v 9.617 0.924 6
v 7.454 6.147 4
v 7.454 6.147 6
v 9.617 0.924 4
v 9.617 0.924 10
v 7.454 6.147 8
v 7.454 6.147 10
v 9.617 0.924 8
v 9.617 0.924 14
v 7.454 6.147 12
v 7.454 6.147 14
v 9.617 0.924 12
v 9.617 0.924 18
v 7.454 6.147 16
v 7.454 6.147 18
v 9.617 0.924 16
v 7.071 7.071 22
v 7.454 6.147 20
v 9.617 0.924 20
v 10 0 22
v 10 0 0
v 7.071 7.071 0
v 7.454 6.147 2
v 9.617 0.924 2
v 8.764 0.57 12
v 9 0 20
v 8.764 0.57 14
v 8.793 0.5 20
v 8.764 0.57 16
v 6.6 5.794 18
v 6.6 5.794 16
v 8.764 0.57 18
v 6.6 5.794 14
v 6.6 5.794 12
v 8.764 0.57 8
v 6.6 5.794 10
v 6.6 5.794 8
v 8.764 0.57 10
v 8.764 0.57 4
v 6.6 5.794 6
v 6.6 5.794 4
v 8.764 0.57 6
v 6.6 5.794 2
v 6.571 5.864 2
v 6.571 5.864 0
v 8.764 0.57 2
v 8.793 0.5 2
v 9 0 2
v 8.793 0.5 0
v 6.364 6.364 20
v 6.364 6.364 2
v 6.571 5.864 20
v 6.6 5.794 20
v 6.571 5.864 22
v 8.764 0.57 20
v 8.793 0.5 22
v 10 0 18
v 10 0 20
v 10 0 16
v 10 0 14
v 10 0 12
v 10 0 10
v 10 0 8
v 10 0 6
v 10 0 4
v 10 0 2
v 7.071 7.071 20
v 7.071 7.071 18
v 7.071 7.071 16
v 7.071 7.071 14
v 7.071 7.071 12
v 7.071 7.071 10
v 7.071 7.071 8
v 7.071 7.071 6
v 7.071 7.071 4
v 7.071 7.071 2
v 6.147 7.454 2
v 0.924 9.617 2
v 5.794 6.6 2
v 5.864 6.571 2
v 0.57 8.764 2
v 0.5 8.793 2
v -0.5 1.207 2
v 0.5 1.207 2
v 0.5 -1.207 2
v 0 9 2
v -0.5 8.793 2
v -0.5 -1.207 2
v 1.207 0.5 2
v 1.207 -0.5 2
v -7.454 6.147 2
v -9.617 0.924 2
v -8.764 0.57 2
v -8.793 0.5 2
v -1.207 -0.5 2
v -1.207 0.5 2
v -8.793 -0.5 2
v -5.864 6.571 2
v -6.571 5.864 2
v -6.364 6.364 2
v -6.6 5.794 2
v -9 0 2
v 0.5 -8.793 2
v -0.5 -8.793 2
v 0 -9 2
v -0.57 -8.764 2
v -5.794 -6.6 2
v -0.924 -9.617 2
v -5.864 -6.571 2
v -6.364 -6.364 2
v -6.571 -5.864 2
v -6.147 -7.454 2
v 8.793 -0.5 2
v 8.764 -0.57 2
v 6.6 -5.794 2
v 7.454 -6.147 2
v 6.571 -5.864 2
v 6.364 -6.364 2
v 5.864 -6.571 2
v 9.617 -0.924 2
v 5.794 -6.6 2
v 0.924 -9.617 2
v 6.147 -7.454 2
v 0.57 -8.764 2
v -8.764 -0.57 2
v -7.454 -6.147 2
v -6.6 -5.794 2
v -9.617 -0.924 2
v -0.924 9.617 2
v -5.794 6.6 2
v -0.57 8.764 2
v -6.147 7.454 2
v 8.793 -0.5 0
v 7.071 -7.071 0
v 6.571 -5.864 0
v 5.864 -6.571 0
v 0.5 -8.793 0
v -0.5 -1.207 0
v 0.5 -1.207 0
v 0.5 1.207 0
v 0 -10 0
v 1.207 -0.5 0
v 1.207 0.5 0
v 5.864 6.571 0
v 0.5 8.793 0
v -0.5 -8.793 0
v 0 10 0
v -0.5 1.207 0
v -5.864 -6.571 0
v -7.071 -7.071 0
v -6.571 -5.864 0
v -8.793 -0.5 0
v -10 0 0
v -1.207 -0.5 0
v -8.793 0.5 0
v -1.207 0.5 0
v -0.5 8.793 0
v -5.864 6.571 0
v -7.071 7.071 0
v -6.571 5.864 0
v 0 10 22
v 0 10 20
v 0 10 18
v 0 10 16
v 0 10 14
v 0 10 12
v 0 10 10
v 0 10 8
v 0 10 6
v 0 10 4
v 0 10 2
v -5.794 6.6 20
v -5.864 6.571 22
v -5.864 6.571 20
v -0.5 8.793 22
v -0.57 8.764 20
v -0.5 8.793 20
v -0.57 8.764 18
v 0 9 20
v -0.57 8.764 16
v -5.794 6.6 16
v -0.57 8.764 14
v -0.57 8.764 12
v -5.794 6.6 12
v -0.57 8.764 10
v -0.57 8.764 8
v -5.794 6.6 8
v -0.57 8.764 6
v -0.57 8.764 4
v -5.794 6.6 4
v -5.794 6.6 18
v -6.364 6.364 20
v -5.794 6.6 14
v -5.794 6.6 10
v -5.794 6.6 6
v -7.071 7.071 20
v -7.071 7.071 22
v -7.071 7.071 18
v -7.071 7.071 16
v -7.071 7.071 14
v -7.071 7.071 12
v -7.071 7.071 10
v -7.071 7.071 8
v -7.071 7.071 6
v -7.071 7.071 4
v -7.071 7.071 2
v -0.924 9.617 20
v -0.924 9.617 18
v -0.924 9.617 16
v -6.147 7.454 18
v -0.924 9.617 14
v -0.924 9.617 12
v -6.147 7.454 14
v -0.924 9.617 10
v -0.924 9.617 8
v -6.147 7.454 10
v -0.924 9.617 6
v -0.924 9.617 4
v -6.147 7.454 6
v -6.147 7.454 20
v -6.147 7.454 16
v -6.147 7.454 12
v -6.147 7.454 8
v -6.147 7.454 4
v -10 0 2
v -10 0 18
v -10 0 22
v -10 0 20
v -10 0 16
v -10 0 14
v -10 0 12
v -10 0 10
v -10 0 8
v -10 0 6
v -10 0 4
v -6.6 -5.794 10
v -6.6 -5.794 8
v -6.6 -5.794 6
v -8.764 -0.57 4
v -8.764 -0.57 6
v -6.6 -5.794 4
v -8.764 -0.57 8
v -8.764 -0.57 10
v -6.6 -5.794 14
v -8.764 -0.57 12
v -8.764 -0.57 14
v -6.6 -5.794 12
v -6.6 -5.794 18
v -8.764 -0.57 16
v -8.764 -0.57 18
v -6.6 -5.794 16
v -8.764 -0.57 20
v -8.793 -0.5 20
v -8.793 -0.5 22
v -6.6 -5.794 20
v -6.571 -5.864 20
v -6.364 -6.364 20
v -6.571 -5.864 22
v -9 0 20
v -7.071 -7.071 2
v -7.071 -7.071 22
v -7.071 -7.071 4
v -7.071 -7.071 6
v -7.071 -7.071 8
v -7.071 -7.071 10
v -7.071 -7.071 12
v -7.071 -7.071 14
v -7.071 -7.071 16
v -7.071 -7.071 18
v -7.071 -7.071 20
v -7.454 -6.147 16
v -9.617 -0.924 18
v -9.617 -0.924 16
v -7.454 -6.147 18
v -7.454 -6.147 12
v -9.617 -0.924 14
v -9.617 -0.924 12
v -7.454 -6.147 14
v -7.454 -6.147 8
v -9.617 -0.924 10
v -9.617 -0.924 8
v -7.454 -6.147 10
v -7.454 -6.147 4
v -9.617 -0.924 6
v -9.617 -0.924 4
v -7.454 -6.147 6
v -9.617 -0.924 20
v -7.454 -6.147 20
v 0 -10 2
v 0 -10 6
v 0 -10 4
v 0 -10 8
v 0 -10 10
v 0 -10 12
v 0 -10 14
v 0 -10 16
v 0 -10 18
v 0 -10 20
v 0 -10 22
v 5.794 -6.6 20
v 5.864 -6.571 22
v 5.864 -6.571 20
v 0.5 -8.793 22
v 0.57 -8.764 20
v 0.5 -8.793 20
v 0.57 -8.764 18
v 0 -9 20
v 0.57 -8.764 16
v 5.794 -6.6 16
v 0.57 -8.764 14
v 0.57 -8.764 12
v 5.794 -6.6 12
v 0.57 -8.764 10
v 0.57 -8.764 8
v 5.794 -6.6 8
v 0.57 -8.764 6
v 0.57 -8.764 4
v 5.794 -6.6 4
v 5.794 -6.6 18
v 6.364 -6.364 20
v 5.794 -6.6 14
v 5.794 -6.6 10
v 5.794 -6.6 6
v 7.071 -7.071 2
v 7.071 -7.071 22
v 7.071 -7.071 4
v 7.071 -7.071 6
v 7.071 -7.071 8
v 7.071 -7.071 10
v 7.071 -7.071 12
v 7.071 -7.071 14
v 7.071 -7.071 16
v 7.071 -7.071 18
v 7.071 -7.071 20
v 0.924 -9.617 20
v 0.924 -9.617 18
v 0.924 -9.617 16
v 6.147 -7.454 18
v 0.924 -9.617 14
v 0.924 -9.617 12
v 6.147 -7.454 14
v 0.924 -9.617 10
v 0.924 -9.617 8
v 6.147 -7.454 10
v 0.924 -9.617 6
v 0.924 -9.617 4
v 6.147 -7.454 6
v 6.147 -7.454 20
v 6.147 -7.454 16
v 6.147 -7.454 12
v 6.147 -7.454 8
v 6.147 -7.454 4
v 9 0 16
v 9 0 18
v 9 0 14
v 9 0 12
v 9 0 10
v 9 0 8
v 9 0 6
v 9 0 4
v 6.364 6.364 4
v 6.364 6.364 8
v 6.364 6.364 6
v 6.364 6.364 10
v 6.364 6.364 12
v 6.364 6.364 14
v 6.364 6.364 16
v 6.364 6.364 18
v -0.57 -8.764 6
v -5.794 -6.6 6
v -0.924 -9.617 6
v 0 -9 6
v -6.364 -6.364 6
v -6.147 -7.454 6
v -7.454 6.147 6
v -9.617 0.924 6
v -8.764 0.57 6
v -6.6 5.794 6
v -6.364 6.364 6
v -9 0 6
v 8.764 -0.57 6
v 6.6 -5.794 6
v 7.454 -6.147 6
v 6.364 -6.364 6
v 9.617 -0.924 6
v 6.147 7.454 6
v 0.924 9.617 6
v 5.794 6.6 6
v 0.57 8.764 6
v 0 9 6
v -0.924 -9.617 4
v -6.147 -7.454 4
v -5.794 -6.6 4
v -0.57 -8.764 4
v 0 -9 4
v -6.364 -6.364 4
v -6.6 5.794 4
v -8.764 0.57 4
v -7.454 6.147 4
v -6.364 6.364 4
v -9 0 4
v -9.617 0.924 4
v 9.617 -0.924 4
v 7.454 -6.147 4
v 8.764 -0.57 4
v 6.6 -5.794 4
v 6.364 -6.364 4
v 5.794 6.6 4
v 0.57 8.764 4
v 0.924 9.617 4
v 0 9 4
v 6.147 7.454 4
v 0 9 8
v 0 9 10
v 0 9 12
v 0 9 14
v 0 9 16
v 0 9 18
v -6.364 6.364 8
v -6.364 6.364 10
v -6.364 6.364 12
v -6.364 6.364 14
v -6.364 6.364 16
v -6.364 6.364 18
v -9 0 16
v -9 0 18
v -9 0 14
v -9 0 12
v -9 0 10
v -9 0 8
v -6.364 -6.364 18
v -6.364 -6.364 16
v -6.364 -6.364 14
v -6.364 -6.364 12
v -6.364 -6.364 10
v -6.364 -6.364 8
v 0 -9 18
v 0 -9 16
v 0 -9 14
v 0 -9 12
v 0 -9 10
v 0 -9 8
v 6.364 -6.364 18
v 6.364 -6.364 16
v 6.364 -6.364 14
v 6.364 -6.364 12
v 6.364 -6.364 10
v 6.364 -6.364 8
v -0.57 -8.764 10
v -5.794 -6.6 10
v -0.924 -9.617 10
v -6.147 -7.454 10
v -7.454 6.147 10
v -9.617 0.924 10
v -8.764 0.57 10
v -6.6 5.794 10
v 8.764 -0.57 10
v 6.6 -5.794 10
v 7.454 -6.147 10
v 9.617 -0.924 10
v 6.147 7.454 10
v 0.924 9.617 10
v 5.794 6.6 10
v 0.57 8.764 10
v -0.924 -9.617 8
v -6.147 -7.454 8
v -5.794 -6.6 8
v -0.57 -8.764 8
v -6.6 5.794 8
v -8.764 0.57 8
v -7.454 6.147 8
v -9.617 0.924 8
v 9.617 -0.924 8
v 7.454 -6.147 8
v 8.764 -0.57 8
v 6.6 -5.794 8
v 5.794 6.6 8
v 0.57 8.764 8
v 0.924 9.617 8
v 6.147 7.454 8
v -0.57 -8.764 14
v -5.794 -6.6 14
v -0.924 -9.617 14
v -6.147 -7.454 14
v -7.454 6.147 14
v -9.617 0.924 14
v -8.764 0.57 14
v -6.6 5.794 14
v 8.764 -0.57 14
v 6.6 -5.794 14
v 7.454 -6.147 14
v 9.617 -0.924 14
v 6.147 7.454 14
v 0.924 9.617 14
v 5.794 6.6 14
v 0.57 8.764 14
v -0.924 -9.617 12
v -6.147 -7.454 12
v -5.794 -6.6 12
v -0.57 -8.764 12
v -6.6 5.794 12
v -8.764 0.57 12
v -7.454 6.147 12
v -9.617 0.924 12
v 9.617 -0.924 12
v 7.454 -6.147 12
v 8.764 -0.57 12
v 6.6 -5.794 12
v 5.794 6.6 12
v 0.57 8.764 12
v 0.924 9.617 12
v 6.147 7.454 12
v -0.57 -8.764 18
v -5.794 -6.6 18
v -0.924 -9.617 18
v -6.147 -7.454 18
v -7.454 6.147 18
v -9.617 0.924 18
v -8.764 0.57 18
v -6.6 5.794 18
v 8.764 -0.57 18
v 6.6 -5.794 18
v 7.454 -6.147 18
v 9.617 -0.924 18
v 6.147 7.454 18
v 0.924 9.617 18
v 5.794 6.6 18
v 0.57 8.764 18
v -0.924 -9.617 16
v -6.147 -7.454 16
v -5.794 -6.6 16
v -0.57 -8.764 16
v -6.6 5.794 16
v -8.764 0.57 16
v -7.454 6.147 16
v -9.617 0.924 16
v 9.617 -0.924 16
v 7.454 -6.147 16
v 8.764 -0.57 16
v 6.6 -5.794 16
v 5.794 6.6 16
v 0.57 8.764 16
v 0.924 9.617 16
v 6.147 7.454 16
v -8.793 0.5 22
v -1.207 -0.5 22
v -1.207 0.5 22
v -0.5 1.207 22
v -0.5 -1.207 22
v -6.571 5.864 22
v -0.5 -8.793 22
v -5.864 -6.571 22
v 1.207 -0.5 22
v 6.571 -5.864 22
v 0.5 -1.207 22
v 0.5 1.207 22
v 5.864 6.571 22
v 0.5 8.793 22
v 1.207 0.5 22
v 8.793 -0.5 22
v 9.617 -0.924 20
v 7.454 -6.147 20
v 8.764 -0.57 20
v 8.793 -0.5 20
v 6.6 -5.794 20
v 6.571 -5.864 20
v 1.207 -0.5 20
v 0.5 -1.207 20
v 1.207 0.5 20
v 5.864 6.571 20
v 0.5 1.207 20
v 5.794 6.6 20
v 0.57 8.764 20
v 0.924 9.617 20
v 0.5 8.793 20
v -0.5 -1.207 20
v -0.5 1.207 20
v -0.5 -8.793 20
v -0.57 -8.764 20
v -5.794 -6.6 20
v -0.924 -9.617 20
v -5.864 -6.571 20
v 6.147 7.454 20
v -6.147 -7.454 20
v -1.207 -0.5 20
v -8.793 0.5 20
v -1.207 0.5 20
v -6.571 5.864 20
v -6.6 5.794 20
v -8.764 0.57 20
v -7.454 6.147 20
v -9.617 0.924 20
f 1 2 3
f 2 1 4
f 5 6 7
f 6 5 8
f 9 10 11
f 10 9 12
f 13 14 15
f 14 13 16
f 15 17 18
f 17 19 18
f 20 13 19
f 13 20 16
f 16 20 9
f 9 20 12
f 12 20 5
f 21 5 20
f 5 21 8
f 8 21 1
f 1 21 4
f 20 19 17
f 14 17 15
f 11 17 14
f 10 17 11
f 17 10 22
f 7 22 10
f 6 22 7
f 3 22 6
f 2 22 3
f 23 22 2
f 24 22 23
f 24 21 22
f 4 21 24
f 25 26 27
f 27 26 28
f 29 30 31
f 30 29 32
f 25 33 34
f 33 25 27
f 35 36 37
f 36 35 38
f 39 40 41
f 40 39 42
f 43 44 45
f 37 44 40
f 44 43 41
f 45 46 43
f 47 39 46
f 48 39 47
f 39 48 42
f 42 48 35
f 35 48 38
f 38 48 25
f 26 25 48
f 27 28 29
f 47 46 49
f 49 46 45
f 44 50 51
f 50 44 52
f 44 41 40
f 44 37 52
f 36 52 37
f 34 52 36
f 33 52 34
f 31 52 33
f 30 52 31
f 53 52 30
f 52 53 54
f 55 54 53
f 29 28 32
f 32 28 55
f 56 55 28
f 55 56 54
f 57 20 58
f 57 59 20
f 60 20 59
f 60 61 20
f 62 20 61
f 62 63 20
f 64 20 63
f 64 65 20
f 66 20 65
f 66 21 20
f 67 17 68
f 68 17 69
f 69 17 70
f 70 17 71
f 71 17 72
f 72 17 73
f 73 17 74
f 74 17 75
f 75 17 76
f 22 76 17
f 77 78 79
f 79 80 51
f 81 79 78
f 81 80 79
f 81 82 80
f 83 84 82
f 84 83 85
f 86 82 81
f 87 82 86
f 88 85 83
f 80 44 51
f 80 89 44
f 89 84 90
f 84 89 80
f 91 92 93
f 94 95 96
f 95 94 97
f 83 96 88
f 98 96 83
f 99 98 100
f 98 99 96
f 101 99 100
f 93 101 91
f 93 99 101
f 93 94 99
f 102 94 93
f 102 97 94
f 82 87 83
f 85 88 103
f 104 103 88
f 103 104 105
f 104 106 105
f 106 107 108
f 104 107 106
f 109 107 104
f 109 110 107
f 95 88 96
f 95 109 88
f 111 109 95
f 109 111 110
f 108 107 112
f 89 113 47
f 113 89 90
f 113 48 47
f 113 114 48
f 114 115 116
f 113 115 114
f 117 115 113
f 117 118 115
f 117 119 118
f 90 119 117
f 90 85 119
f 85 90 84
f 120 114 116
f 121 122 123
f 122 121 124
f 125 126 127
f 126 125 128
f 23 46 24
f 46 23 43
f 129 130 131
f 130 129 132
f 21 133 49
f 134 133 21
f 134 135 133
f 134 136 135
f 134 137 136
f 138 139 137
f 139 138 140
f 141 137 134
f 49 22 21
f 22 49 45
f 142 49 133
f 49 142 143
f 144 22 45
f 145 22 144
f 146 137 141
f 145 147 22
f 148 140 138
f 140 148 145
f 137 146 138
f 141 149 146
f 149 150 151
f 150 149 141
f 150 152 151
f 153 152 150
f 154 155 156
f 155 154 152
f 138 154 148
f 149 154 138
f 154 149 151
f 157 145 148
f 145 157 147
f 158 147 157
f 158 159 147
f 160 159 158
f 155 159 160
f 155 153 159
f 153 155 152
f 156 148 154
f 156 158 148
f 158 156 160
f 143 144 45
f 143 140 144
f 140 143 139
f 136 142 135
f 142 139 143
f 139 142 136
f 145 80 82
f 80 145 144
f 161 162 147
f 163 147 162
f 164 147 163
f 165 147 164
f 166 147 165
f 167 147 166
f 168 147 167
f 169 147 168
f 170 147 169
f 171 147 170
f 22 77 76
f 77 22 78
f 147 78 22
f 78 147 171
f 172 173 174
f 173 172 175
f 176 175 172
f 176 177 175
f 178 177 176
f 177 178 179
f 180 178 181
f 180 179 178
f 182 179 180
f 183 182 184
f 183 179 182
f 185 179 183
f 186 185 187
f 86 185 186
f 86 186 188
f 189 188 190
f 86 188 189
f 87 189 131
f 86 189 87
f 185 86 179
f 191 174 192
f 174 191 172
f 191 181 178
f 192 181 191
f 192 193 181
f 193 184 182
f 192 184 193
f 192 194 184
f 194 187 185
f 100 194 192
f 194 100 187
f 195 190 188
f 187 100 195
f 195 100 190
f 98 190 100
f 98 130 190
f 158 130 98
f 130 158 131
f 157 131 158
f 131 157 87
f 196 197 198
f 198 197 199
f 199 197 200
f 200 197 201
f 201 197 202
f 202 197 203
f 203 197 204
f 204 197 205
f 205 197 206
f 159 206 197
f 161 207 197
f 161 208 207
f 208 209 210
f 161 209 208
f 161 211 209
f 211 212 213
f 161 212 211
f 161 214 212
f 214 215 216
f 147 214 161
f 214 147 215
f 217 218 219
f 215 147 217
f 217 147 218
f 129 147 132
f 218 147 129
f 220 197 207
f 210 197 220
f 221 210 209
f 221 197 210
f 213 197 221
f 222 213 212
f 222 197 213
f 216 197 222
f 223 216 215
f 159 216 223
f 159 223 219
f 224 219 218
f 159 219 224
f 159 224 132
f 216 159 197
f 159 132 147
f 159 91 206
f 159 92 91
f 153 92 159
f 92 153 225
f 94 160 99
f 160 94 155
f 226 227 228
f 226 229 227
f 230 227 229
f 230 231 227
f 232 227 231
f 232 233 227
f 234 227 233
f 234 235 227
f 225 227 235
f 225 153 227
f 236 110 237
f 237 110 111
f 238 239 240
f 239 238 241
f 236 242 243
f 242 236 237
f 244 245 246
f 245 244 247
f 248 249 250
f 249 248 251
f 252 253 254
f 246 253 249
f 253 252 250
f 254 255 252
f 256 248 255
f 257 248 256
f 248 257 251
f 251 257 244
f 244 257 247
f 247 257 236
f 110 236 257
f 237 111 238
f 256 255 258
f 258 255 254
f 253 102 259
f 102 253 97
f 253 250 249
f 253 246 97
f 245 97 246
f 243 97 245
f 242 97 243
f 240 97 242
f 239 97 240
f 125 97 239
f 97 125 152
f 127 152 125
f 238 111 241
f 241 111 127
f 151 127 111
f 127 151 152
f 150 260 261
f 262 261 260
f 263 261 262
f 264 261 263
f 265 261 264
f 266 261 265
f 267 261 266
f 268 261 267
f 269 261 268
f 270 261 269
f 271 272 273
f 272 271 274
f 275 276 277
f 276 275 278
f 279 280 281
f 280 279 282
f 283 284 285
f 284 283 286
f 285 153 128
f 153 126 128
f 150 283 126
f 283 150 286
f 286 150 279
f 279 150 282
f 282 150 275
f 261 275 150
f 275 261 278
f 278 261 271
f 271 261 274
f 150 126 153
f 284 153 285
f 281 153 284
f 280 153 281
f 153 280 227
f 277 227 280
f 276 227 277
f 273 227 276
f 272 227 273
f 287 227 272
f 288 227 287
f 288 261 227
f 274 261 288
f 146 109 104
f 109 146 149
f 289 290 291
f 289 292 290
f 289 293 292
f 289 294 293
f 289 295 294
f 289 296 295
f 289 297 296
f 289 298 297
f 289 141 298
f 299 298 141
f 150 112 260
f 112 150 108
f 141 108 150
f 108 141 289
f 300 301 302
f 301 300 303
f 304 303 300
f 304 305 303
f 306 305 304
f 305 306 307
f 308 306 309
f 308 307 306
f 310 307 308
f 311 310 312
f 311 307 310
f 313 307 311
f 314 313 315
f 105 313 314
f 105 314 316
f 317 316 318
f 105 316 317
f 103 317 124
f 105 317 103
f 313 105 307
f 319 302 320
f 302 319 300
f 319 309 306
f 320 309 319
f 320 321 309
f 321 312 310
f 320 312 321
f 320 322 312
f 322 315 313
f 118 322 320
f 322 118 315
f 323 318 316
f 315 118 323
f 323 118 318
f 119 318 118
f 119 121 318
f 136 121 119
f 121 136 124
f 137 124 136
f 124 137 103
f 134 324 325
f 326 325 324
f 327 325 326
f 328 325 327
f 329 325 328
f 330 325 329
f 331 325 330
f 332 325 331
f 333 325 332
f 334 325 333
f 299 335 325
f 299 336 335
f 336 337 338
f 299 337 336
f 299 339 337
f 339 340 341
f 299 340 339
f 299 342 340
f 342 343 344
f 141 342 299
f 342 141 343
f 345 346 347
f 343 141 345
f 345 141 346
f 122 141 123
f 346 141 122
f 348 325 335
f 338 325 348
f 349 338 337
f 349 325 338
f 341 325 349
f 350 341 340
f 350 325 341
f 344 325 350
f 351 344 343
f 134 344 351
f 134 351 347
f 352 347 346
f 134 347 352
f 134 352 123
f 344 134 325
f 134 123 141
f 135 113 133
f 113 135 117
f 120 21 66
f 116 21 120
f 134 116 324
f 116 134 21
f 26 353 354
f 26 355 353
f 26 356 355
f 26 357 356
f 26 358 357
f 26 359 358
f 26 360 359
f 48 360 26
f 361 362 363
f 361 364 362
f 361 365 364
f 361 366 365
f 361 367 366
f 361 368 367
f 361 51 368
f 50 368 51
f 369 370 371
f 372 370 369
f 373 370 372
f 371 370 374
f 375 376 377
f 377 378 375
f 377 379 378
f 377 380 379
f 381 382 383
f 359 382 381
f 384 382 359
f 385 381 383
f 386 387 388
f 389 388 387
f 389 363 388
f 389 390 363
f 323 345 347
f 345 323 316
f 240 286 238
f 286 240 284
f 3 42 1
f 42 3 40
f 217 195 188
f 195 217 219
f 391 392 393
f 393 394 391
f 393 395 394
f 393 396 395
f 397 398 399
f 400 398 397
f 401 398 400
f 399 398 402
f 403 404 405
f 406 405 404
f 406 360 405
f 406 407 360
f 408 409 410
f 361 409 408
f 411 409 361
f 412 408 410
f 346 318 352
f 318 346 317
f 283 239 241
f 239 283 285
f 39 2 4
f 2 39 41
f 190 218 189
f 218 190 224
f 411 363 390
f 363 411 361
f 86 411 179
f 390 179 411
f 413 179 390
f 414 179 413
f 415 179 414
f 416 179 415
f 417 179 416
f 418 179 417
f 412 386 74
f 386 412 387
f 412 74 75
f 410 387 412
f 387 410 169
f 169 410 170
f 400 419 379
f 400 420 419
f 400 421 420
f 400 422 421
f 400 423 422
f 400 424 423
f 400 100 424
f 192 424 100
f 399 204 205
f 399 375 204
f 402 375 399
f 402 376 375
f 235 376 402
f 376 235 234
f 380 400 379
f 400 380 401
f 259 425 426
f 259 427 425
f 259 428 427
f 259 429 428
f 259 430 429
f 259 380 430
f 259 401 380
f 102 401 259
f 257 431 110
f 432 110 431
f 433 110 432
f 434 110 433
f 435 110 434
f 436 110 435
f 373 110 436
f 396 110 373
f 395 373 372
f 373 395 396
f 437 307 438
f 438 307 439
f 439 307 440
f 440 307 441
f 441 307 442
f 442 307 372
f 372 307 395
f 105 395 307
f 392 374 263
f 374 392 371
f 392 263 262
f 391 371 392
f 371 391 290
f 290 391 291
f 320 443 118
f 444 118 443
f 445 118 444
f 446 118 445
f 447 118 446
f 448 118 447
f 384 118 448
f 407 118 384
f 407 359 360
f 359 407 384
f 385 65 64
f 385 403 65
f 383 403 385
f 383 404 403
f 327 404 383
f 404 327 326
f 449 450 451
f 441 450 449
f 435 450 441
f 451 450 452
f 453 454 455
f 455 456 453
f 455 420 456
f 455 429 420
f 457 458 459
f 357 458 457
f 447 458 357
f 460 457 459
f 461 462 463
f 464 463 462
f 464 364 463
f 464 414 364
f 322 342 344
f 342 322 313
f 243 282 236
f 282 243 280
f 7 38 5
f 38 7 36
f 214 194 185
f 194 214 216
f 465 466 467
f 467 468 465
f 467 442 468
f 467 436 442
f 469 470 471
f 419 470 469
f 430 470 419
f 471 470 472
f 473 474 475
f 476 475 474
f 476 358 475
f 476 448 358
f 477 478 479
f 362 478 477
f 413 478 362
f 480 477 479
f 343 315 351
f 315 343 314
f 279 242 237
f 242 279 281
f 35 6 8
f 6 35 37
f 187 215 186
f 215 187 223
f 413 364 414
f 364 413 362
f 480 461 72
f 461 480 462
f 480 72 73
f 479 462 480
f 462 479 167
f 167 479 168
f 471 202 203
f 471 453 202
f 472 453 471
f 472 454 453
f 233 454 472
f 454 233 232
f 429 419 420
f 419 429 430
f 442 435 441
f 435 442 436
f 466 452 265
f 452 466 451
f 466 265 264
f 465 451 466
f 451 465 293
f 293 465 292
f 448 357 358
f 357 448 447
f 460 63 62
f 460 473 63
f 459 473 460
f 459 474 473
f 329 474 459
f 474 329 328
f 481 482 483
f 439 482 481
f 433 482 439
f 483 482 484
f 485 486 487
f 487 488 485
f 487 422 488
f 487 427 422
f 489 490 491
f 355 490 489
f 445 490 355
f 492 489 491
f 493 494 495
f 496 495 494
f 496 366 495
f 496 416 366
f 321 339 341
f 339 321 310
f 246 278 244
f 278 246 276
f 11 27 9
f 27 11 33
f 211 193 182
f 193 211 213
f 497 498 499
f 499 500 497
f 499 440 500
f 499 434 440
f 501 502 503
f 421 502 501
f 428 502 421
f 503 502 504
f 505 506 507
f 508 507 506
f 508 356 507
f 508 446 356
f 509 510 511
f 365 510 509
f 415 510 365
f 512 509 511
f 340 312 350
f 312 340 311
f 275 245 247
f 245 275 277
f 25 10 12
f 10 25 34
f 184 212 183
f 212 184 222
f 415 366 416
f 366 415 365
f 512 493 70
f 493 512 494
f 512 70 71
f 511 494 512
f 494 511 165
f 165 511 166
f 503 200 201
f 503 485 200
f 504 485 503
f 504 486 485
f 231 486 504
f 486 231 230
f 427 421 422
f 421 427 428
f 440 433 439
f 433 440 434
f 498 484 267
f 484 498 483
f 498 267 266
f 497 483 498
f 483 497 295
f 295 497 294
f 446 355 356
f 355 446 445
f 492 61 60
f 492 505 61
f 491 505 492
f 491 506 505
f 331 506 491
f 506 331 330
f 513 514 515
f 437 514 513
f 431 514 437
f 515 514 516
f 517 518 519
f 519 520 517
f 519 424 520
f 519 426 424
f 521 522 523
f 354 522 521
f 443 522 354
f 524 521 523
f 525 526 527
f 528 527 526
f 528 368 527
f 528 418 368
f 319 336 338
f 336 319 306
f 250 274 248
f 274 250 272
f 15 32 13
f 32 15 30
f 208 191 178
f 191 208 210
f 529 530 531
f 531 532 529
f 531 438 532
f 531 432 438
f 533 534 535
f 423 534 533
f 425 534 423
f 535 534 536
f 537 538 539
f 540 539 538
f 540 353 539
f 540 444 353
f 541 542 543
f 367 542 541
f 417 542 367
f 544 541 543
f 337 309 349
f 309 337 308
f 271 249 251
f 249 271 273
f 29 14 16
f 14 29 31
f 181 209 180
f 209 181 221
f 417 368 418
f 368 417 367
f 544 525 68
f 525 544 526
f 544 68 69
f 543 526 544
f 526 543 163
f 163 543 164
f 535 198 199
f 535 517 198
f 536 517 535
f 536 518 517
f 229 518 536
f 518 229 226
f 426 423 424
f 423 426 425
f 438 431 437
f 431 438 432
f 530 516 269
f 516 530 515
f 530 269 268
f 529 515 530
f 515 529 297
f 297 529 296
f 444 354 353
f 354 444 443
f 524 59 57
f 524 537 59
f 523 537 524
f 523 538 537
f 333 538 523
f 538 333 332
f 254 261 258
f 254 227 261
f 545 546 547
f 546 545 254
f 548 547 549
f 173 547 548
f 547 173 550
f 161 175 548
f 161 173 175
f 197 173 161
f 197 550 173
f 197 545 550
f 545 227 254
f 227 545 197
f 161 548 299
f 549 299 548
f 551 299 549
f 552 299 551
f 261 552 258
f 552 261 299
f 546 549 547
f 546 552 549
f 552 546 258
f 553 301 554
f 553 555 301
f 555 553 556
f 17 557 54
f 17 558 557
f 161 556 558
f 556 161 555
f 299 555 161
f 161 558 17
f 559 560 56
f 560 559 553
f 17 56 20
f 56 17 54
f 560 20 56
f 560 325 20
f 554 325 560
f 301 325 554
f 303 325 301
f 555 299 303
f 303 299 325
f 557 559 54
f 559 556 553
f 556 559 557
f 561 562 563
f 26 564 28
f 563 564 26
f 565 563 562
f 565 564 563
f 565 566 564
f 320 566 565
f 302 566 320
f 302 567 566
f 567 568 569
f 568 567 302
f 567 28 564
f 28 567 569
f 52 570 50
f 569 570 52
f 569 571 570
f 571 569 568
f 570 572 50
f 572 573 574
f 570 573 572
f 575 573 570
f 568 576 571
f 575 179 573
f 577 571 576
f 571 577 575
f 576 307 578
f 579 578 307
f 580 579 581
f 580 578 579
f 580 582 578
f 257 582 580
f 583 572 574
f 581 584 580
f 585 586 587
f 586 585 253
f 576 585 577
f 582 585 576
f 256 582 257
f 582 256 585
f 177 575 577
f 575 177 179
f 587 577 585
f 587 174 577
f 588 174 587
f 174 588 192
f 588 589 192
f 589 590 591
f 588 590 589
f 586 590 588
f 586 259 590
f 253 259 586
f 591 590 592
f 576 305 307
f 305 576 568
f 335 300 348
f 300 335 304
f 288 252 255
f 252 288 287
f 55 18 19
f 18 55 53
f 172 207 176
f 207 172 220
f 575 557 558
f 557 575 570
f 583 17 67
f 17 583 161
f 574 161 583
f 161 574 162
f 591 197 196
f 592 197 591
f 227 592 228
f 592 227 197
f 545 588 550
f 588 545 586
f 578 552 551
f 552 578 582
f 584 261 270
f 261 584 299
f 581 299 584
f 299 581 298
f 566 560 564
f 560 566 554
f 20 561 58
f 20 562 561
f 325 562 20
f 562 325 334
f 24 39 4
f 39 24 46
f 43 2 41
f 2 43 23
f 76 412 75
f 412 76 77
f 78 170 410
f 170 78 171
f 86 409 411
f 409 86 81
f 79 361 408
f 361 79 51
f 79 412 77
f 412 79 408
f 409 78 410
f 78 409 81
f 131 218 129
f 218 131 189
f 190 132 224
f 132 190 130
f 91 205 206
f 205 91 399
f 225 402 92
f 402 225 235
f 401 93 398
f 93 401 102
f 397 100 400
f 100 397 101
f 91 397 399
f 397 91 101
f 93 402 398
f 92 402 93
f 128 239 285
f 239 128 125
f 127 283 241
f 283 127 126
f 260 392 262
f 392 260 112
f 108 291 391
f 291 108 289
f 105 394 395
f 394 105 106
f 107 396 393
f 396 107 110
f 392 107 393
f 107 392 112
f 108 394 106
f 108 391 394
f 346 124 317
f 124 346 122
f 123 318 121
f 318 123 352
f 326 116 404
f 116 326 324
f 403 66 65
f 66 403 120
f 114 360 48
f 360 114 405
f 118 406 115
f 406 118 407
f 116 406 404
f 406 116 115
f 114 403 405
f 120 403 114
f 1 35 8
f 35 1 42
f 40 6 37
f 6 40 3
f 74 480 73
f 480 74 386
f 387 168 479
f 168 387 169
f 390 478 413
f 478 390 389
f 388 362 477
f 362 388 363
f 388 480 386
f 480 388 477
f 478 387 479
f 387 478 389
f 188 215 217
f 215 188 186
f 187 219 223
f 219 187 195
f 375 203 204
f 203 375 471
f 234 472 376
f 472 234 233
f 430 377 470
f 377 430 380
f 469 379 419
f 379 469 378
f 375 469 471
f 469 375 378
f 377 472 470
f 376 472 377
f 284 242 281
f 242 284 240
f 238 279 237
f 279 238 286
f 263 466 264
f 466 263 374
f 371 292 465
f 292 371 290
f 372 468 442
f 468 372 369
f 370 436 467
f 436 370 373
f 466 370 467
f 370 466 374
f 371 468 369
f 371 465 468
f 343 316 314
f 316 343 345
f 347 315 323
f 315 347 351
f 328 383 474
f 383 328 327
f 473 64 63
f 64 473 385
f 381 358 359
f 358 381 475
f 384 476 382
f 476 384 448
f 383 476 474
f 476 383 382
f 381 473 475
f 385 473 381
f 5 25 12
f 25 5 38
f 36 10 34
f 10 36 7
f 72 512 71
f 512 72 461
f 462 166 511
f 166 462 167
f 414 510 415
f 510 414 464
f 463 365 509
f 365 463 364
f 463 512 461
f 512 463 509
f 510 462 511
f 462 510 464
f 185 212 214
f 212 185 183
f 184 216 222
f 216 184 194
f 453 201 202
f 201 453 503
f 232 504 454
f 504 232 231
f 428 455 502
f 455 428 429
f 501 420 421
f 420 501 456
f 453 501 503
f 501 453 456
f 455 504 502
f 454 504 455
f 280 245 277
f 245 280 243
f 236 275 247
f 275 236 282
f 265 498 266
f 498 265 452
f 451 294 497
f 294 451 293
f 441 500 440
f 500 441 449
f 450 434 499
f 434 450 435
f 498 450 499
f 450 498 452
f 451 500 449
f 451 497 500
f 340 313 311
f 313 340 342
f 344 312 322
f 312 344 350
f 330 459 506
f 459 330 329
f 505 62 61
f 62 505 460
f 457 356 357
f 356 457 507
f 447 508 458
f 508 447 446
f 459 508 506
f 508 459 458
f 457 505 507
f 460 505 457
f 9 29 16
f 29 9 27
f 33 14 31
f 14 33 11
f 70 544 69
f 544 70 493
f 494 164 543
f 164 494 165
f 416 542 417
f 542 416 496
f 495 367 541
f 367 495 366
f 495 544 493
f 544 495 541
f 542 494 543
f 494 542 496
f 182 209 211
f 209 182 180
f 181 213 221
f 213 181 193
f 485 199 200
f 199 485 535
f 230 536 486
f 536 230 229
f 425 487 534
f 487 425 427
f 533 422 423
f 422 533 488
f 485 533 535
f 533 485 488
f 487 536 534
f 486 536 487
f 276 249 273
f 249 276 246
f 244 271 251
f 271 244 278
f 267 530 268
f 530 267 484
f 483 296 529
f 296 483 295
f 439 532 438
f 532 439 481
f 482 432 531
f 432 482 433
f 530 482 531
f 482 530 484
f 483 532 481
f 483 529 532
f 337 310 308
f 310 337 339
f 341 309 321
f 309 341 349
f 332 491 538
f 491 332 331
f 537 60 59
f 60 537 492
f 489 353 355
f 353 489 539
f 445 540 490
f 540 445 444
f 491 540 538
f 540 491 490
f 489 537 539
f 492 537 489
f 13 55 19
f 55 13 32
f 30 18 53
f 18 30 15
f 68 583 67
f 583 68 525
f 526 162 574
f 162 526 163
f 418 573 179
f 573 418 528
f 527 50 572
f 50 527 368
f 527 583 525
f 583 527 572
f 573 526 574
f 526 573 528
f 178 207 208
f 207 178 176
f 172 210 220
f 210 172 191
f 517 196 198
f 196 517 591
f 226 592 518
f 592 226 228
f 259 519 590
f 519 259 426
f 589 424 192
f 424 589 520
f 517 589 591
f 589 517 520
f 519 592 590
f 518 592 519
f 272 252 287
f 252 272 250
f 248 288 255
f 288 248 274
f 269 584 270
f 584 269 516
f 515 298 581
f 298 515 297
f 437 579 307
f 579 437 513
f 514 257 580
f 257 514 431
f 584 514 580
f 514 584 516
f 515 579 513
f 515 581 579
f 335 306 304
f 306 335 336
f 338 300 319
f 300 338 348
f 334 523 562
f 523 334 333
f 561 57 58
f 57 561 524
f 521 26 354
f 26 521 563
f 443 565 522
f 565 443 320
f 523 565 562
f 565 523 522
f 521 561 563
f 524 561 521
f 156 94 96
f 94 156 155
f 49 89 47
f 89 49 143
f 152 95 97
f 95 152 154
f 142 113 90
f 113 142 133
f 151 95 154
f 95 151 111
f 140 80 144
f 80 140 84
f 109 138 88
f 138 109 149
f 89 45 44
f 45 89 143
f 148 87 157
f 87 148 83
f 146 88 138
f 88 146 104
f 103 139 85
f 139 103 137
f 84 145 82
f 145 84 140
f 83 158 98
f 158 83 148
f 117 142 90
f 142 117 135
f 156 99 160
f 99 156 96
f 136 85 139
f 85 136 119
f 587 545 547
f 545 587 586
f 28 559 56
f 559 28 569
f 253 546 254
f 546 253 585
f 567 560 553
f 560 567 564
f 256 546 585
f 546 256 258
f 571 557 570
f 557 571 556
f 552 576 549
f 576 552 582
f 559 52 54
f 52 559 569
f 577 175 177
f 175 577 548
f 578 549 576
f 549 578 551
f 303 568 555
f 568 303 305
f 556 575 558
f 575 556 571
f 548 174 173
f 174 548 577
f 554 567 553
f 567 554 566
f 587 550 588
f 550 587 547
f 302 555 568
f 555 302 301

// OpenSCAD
//12*14

$fn = 32;

thickness = 1;

feeder_w = 20;
feeder_h = 50;

grille_fill_h = 2;

feeder_fills_count = 11;
cover_count = 5;
chunks = 8;


sector_angle = (180 * thickness) / feeder_w;

feeder();

module cover_platform(d) {
    width = feeder_w - thickness;
    angle = 360 / chunks;
    for (i = [0:chunks - 1]) {
        rotate([0, 0, i * angle])
            translate([-width / 2, -thickness / 2, 0])
                cube([width, thickness, grille_fill_h]);
    }

    platform(d = d);
}

module in_between_platform() {
    angle = 360 / chunks;

    for (i = [0:chunks - 1]) {
        rotate([0, 0, angle * i])
            in_between_platform_part();
    }
}

module in_between_platform_part() {
    r = feeder_w / 2;
    angle = 360 / chunks;
    length = feeder_w * sin (angle / 2);
    v = sqrt(r * r - (length / 2) * (length / 2));
    vector = cartesian_from_polar(length = r, angle = angle);
    
    difference () {
        platform_substracted_sector(r = r, angle = angle);
        rotate([0, 0, angle / 2 - 90])
                translate([-length / 2 + thickness, v - thickness, 0])
                    cube([length - thickness * 2, thickness, grille_fill_h]);
    }

}

module platform(d) {
    r = d / 2;
    angle = 360 / chunks;

    for (i = [0:chunks - 1]) {
        rotate([0, 0, angle * i])
            platform_substracted_sector(r = r, angle = angle);
    }
}

module platform_substracted_sector(r, angle) {
    A = cartesian_from_polar(length = r, angle = 0);
    B = cartesian_from_polar(length = r, angle = angle);
    r2 = r - thickness;
    C = cartesian_from_polar(length = r2, angle =0);
    D = cartesian_from_polar(length = r2, angle = angle);

    linear_extrude(height = grille_fill_h)
        polygon(points = [
            B,
            A,
            C,
            D,
        ]);
}

module platform_sector(r, angle) {
    c = r;
    A = cartesian_from_polar(length = c, angle = 0);
    B = cartesian_from_polar(length = c, angle = angle);

    linear_extrude(height = grille_fill_h)
        polygon(points = [
            [0, 0],
            B,
            A
        ]);
}

module feeder() {
    for (i = [0:2:feeder_fills_count - 1])
        translate([0, 0, i * grille_fill_h])
            platform(d = feeder_w);

    for (i = [1:2:feeder_fills_count - 1])
        translate([0, 0, i * grille_fill_h])
            in_between_platform();

    cover_platform(d = feeder_w);
    translate([0, 0, (feeder_fills_count - 1) * grille_fill_h]) {
        cover_platform(d = feeder_w);
    }
}

function cartesian_from_polar(length, angle) = [ length * cos(angle), length * sin(angle)];
